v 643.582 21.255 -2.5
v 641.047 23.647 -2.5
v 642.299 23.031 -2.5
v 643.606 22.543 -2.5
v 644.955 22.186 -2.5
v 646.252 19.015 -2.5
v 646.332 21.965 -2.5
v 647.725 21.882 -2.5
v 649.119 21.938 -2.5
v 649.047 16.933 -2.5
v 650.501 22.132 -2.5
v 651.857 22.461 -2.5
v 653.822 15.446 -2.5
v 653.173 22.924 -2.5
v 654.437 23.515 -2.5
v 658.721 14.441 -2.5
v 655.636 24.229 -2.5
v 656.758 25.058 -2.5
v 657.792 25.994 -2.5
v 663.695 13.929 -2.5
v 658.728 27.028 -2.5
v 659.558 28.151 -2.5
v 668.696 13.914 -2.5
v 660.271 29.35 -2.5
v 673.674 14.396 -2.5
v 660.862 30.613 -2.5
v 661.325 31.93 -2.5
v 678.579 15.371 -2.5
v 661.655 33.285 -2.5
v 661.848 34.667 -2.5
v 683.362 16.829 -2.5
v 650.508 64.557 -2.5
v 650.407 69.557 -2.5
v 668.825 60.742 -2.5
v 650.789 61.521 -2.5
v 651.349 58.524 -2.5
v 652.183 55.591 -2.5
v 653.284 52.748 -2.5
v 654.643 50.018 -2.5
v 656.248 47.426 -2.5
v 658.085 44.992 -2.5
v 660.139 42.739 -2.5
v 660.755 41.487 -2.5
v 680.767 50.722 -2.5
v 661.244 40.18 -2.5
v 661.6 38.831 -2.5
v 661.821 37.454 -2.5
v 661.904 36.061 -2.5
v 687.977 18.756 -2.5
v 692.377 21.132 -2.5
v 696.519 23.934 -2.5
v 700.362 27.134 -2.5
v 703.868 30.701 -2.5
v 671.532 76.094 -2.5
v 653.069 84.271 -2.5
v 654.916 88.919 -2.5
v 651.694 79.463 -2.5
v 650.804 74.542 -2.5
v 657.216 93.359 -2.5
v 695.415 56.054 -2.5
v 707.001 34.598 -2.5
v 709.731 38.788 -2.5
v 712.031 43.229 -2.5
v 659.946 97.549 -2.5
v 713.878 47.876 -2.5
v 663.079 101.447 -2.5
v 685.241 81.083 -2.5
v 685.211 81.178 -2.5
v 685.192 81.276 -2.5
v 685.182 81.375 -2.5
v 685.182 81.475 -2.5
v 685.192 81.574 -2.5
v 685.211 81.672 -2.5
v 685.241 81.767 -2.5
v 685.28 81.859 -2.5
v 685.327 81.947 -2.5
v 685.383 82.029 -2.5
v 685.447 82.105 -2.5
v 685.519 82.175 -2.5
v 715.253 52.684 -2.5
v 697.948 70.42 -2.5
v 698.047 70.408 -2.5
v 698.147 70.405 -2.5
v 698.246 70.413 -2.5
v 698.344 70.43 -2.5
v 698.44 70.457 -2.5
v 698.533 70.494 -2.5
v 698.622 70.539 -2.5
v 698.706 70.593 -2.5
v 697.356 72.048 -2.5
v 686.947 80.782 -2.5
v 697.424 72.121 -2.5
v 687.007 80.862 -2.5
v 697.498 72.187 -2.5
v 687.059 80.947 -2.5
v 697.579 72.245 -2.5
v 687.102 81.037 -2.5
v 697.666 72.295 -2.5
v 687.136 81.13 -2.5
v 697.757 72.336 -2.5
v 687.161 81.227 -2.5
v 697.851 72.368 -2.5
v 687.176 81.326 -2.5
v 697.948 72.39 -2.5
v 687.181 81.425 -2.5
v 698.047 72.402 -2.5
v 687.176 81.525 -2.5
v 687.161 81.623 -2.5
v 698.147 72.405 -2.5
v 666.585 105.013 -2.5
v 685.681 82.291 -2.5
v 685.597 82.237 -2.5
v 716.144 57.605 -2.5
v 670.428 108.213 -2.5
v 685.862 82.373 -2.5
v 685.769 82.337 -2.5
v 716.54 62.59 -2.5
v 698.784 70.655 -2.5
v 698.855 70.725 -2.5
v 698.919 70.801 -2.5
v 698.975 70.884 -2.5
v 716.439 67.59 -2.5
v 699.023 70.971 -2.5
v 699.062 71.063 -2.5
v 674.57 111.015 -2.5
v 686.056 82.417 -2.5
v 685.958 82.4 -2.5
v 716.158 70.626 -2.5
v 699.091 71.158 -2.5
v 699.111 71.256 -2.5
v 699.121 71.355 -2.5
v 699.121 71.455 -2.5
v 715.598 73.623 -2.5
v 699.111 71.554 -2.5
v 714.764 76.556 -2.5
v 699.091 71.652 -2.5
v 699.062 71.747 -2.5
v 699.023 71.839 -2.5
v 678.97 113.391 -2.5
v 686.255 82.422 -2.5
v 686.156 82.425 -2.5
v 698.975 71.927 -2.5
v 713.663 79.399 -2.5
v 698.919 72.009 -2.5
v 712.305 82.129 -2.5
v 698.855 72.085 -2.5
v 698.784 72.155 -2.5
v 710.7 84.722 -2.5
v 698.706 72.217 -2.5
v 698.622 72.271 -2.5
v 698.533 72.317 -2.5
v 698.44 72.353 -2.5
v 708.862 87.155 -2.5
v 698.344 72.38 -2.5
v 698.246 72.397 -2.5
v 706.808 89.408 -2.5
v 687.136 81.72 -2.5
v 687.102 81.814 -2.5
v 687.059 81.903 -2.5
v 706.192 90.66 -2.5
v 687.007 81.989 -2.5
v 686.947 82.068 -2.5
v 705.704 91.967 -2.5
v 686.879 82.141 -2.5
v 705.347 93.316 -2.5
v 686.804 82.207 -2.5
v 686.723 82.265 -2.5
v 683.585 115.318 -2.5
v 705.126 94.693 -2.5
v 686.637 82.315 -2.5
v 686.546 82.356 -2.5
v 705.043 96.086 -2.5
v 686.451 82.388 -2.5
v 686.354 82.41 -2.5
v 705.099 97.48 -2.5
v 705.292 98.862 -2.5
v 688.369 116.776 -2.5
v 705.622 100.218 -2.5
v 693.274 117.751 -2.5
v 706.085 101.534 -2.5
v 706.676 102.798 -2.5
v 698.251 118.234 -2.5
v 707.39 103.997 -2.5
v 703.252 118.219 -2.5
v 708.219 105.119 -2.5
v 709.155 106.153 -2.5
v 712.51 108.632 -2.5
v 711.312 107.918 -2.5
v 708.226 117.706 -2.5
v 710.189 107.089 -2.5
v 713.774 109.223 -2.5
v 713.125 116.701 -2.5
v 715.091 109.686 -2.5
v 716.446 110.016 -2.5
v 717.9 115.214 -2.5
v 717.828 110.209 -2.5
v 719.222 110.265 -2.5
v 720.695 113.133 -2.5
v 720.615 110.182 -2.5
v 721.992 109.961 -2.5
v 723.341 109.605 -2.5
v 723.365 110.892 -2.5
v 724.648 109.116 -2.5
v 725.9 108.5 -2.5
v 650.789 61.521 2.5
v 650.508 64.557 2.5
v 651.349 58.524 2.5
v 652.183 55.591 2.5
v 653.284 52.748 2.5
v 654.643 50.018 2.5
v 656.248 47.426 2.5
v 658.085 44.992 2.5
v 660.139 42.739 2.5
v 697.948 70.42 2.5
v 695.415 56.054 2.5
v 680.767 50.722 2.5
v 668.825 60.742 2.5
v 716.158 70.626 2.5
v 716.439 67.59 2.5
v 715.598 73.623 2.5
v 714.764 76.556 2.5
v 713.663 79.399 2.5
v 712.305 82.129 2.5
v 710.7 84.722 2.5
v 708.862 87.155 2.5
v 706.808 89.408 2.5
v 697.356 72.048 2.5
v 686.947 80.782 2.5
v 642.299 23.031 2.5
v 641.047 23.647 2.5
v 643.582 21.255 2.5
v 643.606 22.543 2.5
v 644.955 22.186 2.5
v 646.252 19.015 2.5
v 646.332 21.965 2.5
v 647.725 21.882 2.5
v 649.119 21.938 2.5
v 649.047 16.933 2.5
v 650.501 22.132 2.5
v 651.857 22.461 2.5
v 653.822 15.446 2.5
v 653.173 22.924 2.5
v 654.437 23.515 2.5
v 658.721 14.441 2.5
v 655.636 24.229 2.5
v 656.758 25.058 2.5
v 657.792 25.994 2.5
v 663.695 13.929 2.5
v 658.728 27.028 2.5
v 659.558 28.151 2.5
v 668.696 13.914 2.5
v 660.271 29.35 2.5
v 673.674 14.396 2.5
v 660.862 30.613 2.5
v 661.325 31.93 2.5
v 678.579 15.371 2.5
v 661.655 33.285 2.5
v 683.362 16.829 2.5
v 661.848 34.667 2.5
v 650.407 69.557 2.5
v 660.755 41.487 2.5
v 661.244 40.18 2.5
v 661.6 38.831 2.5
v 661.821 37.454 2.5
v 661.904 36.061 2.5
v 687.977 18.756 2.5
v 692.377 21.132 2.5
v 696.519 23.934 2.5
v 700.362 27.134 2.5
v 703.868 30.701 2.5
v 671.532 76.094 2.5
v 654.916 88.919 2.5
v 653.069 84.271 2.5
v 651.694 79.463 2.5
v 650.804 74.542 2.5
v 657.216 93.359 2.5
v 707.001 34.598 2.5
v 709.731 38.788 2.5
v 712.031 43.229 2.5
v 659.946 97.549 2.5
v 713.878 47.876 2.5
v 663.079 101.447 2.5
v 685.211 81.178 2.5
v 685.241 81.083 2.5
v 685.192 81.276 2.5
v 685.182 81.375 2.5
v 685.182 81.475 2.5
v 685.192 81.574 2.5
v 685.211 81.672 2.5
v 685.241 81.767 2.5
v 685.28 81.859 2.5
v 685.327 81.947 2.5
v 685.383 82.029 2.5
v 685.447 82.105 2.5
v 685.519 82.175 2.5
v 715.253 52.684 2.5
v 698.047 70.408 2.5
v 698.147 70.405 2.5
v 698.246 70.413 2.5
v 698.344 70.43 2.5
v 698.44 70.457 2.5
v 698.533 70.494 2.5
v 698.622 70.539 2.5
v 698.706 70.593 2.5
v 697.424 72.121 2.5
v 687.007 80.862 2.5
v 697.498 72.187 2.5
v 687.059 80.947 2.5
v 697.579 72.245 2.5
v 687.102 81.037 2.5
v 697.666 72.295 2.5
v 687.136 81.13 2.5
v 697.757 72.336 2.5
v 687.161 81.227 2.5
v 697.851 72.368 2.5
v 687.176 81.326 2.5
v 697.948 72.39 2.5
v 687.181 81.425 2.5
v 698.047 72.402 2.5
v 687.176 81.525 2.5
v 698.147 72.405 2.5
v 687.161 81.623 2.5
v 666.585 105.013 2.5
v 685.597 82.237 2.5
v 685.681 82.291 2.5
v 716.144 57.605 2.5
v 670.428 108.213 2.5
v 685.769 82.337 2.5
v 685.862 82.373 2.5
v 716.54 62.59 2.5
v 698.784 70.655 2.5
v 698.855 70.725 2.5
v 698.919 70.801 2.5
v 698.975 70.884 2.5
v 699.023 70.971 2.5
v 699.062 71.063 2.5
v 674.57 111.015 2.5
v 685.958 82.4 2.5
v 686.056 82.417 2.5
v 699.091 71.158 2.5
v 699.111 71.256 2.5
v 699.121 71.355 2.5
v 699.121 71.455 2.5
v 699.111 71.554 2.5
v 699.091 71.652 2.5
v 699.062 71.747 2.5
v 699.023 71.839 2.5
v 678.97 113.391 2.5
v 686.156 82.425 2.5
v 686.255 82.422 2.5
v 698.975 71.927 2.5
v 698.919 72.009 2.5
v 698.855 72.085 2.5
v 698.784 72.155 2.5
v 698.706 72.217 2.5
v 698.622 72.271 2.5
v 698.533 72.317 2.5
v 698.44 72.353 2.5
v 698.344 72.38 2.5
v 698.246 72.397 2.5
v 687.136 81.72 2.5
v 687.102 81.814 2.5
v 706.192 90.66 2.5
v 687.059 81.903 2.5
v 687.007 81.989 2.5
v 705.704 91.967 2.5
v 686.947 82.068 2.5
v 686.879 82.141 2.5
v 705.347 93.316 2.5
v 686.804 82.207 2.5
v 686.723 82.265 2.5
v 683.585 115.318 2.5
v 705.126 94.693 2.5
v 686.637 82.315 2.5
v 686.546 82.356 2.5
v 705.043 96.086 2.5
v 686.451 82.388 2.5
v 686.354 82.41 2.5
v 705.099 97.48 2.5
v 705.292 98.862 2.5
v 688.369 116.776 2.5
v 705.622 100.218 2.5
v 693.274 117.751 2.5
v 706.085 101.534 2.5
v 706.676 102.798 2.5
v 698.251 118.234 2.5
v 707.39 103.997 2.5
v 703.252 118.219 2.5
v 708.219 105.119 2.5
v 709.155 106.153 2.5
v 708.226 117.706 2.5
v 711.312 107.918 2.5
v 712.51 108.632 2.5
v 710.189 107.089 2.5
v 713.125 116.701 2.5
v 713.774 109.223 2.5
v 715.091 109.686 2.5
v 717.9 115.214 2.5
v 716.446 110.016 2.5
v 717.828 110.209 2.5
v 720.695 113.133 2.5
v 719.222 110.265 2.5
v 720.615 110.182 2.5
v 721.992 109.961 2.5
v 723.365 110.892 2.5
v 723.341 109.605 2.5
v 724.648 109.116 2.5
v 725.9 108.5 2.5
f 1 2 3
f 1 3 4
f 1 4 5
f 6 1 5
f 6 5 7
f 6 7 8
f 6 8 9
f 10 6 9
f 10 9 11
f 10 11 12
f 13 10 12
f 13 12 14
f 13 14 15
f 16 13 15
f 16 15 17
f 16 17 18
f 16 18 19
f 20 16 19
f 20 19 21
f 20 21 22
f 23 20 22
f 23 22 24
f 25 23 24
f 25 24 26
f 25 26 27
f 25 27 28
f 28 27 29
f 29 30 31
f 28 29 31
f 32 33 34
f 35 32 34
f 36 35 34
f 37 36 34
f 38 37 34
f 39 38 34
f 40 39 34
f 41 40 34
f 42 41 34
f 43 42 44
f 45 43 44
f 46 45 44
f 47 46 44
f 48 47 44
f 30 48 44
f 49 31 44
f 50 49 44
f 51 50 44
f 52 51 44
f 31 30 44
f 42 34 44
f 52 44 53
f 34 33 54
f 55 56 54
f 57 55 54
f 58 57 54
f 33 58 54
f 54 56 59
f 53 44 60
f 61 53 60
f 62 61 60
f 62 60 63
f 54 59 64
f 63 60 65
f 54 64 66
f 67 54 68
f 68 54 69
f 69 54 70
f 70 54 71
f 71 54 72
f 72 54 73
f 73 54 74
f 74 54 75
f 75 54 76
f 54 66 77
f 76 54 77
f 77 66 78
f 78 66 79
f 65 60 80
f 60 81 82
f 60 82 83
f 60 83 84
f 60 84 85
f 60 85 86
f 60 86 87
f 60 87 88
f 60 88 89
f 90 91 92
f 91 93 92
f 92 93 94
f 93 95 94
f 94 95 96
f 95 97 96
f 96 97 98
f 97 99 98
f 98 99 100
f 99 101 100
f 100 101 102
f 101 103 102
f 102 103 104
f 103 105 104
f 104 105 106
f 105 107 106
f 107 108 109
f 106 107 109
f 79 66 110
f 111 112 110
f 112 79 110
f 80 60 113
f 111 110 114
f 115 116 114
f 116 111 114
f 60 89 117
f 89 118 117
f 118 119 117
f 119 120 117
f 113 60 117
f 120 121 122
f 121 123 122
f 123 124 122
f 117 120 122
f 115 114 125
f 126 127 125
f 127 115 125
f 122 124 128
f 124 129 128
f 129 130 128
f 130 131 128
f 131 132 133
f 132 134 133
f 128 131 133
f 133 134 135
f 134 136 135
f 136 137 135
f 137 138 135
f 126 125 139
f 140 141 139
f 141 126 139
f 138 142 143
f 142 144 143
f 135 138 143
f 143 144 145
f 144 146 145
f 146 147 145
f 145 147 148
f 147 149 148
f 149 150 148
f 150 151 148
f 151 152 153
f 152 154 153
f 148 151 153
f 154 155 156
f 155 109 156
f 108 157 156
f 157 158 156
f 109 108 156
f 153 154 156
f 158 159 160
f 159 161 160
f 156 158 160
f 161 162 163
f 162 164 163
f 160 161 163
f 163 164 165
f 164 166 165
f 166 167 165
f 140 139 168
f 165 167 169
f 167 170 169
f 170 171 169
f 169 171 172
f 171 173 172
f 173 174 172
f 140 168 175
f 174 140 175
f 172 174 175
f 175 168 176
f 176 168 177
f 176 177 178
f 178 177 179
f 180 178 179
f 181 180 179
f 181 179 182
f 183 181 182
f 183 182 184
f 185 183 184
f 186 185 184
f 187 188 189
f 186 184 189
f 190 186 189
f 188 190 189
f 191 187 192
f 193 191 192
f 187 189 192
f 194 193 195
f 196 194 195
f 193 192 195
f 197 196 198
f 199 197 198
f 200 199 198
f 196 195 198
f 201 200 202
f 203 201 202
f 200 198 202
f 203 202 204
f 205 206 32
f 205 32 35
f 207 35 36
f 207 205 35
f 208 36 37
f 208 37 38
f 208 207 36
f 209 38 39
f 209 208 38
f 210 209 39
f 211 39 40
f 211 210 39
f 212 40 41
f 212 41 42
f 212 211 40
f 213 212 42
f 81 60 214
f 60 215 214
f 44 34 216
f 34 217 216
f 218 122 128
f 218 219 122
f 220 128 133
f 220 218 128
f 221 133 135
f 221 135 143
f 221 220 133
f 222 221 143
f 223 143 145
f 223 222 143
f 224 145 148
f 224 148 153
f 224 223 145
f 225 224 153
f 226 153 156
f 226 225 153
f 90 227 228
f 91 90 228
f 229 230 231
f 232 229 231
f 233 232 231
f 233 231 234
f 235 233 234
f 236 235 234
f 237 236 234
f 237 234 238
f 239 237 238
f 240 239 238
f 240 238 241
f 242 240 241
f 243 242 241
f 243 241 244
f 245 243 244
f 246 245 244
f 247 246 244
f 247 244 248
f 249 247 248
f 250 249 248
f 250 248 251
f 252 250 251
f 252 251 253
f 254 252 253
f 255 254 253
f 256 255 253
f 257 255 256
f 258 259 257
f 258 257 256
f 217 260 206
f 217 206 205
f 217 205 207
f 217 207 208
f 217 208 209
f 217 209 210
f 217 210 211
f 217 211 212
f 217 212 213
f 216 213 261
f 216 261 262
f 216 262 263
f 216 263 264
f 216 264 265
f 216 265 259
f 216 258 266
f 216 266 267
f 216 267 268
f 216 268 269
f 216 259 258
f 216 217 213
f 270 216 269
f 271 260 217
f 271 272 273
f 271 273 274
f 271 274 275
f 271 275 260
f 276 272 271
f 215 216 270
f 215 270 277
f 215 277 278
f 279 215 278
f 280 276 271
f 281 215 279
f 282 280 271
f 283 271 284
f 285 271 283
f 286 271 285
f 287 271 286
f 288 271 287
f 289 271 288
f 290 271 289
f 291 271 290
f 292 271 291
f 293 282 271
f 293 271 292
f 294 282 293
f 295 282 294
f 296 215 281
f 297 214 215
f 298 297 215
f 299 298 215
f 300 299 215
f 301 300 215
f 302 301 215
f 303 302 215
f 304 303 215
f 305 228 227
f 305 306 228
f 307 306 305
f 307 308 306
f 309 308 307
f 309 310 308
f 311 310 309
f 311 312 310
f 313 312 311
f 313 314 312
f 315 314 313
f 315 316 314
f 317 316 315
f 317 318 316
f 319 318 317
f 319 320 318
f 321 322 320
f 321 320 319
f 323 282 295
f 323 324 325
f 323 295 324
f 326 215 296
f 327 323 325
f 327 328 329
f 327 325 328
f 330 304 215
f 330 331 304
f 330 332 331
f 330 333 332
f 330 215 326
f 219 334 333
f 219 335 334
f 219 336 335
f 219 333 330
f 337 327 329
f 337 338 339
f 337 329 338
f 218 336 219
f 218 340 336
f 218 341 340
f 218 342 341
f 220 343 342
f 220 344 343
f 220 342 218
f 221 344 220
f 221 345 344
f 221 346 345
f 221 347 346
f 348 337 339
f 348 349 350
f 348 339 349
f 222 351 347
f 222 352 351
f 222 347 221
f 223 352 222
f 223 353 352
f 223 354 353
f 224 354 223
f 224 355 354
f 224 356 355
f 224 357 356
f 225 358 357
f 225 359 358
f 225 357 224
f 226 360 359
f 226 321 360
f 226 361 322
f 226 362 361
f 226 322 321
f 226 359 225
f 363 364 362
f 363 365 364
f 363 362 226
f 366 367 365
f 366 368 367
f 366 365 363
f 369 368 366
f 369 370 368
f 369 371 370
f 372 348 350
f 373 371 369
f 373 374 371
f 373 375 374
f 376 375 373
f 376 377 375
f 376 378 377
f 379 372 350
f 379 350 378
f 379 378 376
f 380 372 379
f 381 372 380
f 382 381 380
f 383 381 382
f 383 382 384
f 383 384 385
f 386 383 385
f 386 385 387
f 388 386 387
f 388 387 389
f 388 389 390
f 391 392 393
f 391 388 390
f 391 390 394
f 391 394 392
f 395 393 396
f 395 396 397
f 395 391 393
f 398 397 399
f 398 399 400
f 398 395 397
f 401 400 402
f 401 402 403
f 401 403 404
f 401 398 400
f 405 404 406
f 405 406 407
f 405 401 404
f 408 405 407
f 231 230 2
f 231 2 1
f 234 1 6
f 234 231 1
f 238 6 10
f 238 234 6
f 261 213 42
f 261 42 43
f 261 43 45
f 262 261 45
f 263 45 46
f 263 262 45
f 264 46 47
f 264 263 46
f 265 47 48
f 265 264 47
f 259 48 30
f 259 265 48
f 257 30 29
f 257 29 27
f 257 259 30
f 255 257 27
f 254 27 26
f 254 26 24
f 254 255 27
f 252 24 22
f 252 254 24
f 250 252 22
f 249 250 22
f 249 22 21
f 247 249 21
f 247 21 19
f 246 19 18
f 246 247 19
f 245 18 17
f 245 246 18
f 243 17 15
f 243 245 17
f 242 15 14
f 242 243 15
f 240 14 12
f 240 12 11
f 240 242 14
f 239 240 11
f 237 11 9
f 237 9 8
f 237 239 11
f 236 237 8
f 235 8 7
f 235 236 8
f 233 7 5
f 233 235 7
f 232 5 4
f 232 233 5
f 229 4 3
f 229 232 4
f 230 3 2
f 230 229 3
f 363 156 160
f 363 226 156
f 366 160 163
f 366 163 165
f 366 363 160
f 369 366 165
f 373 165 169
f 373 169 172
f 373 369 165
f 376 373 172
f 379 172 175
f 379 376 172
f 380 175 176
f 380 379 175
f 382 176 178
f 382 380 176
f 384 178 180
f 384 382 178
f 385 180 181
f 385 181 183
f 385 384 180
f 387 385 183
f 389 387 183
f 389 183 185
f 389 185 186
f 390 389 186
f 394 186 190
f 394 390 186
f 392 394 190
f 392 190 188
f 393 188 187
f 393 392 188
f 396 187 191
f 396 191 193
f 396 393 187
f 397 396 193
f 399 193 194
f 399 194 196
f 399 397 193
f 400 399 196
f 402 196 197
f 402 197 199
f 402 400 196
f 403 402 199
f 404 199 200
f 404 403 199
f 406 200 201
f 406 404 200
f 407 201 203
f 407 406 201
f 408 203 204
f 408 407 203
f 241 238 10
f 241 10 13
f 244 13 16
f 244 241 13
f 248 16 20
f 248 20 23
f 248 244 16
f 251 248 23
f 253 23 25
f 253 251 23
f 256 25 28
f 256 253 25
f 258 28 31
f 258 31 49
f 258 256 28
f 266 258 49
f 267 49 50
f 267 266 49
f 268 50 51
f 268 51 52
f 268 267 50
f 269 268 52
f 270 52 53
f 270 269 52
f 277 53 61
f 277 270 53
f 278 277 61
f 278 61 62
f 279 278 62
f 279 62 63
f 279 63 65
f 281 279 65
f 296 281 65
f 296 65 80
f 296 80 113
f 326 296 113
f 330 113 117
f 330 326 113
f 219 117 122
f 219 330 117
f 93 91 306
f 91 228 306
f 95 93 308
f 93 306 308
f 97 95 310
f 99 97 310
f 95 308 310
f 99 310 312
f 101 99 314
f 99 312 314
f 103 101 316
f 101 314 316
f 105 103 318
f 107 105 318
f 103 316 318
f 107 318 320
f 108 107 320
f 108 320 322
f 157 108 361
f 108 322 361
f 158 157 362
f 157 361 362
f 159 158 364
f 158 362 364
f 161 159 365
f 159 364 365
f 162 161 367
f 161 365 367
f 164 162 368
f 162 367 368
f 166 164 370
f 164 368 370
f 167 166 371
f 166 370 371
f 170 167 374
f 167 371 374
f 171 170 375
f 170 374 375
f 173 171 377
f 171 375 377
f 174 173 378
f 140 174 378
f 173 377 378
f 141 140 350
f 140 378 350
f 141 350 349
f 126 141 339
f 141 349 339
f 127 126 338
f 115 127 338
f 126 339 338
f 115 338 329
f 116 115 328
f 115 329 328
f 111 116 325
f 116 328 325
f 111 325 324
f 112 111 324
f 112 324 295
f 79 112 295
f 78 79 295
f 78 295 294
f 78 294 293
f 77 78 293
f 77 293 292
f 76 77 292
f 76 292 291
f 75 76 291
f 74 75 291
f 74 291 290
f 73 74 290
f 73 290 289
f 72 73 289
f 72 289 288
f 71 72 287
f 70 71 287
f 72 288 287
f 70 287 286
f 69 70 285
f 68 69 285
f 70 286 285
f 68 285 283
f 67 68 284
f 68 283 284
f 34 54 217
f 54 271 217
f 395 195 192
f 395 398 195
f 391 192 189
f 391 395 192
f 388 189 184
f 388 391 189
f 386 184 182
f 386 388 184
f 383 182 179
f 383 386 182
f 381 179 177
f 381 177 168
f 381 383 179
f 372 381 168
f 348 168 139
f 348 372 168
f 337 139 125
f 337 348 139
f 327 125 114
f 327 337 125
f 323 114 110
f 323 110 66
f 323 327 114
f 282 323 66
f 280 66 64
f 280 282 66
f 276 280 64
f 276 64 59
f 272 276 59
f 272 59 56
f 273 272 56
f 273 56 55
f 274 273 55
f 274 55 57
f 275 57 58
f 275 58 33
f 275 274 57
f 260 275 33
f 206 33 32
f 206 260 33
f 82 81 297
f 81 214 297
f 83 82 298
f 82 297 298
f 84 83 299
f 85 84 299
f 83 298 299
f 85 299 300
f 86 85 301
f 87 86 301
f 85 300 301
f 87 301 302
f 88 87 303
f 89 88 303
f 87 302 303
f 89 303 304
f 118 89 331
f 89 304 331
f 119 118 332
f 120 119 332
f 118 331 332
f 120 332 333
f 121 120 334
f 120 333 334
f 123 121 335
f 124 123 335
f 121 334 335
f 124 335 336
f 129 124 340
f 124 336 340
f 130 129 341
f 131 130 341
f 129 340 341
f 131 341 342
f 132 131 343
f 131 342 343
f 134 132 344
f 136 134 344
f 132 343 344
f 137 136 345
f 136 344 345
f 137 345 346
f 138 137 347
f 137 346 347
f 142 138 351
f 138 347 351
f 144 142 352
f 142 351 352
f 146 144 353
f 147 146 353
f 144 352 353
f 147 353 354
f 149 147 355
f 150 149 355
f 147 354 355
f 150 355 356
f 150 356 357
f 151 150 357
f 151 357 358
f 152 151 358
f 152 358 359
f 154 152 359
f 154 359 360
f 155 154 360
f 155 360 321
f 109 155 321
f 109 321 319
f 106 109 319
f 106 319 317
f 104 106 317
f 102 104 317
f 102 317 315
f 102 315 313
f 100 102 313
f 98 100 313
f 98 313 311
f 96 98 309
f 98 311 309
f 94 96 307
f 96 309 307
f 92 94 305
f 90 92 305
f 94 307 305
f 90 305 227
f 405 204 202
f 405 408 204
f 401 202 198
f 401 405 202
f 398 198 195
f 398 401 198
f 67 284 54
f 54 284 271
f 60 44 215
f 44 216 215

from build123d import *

# Parameters (mm, degrees)
BOSS_EXTRUDE1_DEPTH = 2.5


with BuildPart() as part:
    # Model → Boss-Extrude1 (new, symmetric)
    with BuildSketch(Plane.XY):
        with BuildLine():
            ThreePointArc((717.900029607, 115.214424851), (670.427821467, 108.213195948), (650.508452339, 64.557194238))
            ThreePointArc((650.508452339, 64.557194238), (653.283849766, 52.747710067), (660.139069353, 42.739078209))
            ThreePointArc((660.139069353, 42.739078209), (657.792156458, 25.994108012), (641.047186261, 23.647195117))
            ThreePointArc((641.047186261, 23.647195117), (644.900795358, 20.115585583), (649.047156658, 16.932779125))
            ThreePointArc((649.047156658, 16.932779125), (696.519364798, 23.934008028), (716.438733926, 67.590009739))
            ThreePointArc((716.438733926, 67.590009739), (713.663336498, 79.399493909), (706.808116912, 89.408125767))
            ThreePointArc((706.808116912, 89.408125767), (709.155029807, 106.153095964), (725.900000004, 108.500008859))
            ThreePointArc((725.900000004, 108.500008859), (722.046390907, 112.031618393), (717.900029607, 115.214424851))
        make_face()
        with BuildLine():
            Line((697.355906954, 72.047955987), (686.946544773, 80.782447954))
            ThreePointArc((686.946544773, 80.782447954), (686.354148507, 82.410043316), (685.240807709, 81.08321542))
            Line((685.240807709, 81.08321542), (671.532142065, 76.093669174))
            Line((671.532142065, 76.093669174), (668.825234868, 60.742035599))
            Line((668.825234868, 60.742035599), (680.766685935, 50.721968413))
            Line((680.766685935, 50.721968413), (695.415044199, 56.053534802))
            Line((695.415044199, 56.053534802), (697.948303219, 70.420360624))
            ThreePointArc((697.948303219, 70.420360624), (699.061644018, 71.747188521), (697.355906954, 72.047955987))
        make_face(mode=Mode.SUBTRACT)
    extrude(amount=BOSS_EXTRUDE1_DEPTH, both=True)


solid = part.part
